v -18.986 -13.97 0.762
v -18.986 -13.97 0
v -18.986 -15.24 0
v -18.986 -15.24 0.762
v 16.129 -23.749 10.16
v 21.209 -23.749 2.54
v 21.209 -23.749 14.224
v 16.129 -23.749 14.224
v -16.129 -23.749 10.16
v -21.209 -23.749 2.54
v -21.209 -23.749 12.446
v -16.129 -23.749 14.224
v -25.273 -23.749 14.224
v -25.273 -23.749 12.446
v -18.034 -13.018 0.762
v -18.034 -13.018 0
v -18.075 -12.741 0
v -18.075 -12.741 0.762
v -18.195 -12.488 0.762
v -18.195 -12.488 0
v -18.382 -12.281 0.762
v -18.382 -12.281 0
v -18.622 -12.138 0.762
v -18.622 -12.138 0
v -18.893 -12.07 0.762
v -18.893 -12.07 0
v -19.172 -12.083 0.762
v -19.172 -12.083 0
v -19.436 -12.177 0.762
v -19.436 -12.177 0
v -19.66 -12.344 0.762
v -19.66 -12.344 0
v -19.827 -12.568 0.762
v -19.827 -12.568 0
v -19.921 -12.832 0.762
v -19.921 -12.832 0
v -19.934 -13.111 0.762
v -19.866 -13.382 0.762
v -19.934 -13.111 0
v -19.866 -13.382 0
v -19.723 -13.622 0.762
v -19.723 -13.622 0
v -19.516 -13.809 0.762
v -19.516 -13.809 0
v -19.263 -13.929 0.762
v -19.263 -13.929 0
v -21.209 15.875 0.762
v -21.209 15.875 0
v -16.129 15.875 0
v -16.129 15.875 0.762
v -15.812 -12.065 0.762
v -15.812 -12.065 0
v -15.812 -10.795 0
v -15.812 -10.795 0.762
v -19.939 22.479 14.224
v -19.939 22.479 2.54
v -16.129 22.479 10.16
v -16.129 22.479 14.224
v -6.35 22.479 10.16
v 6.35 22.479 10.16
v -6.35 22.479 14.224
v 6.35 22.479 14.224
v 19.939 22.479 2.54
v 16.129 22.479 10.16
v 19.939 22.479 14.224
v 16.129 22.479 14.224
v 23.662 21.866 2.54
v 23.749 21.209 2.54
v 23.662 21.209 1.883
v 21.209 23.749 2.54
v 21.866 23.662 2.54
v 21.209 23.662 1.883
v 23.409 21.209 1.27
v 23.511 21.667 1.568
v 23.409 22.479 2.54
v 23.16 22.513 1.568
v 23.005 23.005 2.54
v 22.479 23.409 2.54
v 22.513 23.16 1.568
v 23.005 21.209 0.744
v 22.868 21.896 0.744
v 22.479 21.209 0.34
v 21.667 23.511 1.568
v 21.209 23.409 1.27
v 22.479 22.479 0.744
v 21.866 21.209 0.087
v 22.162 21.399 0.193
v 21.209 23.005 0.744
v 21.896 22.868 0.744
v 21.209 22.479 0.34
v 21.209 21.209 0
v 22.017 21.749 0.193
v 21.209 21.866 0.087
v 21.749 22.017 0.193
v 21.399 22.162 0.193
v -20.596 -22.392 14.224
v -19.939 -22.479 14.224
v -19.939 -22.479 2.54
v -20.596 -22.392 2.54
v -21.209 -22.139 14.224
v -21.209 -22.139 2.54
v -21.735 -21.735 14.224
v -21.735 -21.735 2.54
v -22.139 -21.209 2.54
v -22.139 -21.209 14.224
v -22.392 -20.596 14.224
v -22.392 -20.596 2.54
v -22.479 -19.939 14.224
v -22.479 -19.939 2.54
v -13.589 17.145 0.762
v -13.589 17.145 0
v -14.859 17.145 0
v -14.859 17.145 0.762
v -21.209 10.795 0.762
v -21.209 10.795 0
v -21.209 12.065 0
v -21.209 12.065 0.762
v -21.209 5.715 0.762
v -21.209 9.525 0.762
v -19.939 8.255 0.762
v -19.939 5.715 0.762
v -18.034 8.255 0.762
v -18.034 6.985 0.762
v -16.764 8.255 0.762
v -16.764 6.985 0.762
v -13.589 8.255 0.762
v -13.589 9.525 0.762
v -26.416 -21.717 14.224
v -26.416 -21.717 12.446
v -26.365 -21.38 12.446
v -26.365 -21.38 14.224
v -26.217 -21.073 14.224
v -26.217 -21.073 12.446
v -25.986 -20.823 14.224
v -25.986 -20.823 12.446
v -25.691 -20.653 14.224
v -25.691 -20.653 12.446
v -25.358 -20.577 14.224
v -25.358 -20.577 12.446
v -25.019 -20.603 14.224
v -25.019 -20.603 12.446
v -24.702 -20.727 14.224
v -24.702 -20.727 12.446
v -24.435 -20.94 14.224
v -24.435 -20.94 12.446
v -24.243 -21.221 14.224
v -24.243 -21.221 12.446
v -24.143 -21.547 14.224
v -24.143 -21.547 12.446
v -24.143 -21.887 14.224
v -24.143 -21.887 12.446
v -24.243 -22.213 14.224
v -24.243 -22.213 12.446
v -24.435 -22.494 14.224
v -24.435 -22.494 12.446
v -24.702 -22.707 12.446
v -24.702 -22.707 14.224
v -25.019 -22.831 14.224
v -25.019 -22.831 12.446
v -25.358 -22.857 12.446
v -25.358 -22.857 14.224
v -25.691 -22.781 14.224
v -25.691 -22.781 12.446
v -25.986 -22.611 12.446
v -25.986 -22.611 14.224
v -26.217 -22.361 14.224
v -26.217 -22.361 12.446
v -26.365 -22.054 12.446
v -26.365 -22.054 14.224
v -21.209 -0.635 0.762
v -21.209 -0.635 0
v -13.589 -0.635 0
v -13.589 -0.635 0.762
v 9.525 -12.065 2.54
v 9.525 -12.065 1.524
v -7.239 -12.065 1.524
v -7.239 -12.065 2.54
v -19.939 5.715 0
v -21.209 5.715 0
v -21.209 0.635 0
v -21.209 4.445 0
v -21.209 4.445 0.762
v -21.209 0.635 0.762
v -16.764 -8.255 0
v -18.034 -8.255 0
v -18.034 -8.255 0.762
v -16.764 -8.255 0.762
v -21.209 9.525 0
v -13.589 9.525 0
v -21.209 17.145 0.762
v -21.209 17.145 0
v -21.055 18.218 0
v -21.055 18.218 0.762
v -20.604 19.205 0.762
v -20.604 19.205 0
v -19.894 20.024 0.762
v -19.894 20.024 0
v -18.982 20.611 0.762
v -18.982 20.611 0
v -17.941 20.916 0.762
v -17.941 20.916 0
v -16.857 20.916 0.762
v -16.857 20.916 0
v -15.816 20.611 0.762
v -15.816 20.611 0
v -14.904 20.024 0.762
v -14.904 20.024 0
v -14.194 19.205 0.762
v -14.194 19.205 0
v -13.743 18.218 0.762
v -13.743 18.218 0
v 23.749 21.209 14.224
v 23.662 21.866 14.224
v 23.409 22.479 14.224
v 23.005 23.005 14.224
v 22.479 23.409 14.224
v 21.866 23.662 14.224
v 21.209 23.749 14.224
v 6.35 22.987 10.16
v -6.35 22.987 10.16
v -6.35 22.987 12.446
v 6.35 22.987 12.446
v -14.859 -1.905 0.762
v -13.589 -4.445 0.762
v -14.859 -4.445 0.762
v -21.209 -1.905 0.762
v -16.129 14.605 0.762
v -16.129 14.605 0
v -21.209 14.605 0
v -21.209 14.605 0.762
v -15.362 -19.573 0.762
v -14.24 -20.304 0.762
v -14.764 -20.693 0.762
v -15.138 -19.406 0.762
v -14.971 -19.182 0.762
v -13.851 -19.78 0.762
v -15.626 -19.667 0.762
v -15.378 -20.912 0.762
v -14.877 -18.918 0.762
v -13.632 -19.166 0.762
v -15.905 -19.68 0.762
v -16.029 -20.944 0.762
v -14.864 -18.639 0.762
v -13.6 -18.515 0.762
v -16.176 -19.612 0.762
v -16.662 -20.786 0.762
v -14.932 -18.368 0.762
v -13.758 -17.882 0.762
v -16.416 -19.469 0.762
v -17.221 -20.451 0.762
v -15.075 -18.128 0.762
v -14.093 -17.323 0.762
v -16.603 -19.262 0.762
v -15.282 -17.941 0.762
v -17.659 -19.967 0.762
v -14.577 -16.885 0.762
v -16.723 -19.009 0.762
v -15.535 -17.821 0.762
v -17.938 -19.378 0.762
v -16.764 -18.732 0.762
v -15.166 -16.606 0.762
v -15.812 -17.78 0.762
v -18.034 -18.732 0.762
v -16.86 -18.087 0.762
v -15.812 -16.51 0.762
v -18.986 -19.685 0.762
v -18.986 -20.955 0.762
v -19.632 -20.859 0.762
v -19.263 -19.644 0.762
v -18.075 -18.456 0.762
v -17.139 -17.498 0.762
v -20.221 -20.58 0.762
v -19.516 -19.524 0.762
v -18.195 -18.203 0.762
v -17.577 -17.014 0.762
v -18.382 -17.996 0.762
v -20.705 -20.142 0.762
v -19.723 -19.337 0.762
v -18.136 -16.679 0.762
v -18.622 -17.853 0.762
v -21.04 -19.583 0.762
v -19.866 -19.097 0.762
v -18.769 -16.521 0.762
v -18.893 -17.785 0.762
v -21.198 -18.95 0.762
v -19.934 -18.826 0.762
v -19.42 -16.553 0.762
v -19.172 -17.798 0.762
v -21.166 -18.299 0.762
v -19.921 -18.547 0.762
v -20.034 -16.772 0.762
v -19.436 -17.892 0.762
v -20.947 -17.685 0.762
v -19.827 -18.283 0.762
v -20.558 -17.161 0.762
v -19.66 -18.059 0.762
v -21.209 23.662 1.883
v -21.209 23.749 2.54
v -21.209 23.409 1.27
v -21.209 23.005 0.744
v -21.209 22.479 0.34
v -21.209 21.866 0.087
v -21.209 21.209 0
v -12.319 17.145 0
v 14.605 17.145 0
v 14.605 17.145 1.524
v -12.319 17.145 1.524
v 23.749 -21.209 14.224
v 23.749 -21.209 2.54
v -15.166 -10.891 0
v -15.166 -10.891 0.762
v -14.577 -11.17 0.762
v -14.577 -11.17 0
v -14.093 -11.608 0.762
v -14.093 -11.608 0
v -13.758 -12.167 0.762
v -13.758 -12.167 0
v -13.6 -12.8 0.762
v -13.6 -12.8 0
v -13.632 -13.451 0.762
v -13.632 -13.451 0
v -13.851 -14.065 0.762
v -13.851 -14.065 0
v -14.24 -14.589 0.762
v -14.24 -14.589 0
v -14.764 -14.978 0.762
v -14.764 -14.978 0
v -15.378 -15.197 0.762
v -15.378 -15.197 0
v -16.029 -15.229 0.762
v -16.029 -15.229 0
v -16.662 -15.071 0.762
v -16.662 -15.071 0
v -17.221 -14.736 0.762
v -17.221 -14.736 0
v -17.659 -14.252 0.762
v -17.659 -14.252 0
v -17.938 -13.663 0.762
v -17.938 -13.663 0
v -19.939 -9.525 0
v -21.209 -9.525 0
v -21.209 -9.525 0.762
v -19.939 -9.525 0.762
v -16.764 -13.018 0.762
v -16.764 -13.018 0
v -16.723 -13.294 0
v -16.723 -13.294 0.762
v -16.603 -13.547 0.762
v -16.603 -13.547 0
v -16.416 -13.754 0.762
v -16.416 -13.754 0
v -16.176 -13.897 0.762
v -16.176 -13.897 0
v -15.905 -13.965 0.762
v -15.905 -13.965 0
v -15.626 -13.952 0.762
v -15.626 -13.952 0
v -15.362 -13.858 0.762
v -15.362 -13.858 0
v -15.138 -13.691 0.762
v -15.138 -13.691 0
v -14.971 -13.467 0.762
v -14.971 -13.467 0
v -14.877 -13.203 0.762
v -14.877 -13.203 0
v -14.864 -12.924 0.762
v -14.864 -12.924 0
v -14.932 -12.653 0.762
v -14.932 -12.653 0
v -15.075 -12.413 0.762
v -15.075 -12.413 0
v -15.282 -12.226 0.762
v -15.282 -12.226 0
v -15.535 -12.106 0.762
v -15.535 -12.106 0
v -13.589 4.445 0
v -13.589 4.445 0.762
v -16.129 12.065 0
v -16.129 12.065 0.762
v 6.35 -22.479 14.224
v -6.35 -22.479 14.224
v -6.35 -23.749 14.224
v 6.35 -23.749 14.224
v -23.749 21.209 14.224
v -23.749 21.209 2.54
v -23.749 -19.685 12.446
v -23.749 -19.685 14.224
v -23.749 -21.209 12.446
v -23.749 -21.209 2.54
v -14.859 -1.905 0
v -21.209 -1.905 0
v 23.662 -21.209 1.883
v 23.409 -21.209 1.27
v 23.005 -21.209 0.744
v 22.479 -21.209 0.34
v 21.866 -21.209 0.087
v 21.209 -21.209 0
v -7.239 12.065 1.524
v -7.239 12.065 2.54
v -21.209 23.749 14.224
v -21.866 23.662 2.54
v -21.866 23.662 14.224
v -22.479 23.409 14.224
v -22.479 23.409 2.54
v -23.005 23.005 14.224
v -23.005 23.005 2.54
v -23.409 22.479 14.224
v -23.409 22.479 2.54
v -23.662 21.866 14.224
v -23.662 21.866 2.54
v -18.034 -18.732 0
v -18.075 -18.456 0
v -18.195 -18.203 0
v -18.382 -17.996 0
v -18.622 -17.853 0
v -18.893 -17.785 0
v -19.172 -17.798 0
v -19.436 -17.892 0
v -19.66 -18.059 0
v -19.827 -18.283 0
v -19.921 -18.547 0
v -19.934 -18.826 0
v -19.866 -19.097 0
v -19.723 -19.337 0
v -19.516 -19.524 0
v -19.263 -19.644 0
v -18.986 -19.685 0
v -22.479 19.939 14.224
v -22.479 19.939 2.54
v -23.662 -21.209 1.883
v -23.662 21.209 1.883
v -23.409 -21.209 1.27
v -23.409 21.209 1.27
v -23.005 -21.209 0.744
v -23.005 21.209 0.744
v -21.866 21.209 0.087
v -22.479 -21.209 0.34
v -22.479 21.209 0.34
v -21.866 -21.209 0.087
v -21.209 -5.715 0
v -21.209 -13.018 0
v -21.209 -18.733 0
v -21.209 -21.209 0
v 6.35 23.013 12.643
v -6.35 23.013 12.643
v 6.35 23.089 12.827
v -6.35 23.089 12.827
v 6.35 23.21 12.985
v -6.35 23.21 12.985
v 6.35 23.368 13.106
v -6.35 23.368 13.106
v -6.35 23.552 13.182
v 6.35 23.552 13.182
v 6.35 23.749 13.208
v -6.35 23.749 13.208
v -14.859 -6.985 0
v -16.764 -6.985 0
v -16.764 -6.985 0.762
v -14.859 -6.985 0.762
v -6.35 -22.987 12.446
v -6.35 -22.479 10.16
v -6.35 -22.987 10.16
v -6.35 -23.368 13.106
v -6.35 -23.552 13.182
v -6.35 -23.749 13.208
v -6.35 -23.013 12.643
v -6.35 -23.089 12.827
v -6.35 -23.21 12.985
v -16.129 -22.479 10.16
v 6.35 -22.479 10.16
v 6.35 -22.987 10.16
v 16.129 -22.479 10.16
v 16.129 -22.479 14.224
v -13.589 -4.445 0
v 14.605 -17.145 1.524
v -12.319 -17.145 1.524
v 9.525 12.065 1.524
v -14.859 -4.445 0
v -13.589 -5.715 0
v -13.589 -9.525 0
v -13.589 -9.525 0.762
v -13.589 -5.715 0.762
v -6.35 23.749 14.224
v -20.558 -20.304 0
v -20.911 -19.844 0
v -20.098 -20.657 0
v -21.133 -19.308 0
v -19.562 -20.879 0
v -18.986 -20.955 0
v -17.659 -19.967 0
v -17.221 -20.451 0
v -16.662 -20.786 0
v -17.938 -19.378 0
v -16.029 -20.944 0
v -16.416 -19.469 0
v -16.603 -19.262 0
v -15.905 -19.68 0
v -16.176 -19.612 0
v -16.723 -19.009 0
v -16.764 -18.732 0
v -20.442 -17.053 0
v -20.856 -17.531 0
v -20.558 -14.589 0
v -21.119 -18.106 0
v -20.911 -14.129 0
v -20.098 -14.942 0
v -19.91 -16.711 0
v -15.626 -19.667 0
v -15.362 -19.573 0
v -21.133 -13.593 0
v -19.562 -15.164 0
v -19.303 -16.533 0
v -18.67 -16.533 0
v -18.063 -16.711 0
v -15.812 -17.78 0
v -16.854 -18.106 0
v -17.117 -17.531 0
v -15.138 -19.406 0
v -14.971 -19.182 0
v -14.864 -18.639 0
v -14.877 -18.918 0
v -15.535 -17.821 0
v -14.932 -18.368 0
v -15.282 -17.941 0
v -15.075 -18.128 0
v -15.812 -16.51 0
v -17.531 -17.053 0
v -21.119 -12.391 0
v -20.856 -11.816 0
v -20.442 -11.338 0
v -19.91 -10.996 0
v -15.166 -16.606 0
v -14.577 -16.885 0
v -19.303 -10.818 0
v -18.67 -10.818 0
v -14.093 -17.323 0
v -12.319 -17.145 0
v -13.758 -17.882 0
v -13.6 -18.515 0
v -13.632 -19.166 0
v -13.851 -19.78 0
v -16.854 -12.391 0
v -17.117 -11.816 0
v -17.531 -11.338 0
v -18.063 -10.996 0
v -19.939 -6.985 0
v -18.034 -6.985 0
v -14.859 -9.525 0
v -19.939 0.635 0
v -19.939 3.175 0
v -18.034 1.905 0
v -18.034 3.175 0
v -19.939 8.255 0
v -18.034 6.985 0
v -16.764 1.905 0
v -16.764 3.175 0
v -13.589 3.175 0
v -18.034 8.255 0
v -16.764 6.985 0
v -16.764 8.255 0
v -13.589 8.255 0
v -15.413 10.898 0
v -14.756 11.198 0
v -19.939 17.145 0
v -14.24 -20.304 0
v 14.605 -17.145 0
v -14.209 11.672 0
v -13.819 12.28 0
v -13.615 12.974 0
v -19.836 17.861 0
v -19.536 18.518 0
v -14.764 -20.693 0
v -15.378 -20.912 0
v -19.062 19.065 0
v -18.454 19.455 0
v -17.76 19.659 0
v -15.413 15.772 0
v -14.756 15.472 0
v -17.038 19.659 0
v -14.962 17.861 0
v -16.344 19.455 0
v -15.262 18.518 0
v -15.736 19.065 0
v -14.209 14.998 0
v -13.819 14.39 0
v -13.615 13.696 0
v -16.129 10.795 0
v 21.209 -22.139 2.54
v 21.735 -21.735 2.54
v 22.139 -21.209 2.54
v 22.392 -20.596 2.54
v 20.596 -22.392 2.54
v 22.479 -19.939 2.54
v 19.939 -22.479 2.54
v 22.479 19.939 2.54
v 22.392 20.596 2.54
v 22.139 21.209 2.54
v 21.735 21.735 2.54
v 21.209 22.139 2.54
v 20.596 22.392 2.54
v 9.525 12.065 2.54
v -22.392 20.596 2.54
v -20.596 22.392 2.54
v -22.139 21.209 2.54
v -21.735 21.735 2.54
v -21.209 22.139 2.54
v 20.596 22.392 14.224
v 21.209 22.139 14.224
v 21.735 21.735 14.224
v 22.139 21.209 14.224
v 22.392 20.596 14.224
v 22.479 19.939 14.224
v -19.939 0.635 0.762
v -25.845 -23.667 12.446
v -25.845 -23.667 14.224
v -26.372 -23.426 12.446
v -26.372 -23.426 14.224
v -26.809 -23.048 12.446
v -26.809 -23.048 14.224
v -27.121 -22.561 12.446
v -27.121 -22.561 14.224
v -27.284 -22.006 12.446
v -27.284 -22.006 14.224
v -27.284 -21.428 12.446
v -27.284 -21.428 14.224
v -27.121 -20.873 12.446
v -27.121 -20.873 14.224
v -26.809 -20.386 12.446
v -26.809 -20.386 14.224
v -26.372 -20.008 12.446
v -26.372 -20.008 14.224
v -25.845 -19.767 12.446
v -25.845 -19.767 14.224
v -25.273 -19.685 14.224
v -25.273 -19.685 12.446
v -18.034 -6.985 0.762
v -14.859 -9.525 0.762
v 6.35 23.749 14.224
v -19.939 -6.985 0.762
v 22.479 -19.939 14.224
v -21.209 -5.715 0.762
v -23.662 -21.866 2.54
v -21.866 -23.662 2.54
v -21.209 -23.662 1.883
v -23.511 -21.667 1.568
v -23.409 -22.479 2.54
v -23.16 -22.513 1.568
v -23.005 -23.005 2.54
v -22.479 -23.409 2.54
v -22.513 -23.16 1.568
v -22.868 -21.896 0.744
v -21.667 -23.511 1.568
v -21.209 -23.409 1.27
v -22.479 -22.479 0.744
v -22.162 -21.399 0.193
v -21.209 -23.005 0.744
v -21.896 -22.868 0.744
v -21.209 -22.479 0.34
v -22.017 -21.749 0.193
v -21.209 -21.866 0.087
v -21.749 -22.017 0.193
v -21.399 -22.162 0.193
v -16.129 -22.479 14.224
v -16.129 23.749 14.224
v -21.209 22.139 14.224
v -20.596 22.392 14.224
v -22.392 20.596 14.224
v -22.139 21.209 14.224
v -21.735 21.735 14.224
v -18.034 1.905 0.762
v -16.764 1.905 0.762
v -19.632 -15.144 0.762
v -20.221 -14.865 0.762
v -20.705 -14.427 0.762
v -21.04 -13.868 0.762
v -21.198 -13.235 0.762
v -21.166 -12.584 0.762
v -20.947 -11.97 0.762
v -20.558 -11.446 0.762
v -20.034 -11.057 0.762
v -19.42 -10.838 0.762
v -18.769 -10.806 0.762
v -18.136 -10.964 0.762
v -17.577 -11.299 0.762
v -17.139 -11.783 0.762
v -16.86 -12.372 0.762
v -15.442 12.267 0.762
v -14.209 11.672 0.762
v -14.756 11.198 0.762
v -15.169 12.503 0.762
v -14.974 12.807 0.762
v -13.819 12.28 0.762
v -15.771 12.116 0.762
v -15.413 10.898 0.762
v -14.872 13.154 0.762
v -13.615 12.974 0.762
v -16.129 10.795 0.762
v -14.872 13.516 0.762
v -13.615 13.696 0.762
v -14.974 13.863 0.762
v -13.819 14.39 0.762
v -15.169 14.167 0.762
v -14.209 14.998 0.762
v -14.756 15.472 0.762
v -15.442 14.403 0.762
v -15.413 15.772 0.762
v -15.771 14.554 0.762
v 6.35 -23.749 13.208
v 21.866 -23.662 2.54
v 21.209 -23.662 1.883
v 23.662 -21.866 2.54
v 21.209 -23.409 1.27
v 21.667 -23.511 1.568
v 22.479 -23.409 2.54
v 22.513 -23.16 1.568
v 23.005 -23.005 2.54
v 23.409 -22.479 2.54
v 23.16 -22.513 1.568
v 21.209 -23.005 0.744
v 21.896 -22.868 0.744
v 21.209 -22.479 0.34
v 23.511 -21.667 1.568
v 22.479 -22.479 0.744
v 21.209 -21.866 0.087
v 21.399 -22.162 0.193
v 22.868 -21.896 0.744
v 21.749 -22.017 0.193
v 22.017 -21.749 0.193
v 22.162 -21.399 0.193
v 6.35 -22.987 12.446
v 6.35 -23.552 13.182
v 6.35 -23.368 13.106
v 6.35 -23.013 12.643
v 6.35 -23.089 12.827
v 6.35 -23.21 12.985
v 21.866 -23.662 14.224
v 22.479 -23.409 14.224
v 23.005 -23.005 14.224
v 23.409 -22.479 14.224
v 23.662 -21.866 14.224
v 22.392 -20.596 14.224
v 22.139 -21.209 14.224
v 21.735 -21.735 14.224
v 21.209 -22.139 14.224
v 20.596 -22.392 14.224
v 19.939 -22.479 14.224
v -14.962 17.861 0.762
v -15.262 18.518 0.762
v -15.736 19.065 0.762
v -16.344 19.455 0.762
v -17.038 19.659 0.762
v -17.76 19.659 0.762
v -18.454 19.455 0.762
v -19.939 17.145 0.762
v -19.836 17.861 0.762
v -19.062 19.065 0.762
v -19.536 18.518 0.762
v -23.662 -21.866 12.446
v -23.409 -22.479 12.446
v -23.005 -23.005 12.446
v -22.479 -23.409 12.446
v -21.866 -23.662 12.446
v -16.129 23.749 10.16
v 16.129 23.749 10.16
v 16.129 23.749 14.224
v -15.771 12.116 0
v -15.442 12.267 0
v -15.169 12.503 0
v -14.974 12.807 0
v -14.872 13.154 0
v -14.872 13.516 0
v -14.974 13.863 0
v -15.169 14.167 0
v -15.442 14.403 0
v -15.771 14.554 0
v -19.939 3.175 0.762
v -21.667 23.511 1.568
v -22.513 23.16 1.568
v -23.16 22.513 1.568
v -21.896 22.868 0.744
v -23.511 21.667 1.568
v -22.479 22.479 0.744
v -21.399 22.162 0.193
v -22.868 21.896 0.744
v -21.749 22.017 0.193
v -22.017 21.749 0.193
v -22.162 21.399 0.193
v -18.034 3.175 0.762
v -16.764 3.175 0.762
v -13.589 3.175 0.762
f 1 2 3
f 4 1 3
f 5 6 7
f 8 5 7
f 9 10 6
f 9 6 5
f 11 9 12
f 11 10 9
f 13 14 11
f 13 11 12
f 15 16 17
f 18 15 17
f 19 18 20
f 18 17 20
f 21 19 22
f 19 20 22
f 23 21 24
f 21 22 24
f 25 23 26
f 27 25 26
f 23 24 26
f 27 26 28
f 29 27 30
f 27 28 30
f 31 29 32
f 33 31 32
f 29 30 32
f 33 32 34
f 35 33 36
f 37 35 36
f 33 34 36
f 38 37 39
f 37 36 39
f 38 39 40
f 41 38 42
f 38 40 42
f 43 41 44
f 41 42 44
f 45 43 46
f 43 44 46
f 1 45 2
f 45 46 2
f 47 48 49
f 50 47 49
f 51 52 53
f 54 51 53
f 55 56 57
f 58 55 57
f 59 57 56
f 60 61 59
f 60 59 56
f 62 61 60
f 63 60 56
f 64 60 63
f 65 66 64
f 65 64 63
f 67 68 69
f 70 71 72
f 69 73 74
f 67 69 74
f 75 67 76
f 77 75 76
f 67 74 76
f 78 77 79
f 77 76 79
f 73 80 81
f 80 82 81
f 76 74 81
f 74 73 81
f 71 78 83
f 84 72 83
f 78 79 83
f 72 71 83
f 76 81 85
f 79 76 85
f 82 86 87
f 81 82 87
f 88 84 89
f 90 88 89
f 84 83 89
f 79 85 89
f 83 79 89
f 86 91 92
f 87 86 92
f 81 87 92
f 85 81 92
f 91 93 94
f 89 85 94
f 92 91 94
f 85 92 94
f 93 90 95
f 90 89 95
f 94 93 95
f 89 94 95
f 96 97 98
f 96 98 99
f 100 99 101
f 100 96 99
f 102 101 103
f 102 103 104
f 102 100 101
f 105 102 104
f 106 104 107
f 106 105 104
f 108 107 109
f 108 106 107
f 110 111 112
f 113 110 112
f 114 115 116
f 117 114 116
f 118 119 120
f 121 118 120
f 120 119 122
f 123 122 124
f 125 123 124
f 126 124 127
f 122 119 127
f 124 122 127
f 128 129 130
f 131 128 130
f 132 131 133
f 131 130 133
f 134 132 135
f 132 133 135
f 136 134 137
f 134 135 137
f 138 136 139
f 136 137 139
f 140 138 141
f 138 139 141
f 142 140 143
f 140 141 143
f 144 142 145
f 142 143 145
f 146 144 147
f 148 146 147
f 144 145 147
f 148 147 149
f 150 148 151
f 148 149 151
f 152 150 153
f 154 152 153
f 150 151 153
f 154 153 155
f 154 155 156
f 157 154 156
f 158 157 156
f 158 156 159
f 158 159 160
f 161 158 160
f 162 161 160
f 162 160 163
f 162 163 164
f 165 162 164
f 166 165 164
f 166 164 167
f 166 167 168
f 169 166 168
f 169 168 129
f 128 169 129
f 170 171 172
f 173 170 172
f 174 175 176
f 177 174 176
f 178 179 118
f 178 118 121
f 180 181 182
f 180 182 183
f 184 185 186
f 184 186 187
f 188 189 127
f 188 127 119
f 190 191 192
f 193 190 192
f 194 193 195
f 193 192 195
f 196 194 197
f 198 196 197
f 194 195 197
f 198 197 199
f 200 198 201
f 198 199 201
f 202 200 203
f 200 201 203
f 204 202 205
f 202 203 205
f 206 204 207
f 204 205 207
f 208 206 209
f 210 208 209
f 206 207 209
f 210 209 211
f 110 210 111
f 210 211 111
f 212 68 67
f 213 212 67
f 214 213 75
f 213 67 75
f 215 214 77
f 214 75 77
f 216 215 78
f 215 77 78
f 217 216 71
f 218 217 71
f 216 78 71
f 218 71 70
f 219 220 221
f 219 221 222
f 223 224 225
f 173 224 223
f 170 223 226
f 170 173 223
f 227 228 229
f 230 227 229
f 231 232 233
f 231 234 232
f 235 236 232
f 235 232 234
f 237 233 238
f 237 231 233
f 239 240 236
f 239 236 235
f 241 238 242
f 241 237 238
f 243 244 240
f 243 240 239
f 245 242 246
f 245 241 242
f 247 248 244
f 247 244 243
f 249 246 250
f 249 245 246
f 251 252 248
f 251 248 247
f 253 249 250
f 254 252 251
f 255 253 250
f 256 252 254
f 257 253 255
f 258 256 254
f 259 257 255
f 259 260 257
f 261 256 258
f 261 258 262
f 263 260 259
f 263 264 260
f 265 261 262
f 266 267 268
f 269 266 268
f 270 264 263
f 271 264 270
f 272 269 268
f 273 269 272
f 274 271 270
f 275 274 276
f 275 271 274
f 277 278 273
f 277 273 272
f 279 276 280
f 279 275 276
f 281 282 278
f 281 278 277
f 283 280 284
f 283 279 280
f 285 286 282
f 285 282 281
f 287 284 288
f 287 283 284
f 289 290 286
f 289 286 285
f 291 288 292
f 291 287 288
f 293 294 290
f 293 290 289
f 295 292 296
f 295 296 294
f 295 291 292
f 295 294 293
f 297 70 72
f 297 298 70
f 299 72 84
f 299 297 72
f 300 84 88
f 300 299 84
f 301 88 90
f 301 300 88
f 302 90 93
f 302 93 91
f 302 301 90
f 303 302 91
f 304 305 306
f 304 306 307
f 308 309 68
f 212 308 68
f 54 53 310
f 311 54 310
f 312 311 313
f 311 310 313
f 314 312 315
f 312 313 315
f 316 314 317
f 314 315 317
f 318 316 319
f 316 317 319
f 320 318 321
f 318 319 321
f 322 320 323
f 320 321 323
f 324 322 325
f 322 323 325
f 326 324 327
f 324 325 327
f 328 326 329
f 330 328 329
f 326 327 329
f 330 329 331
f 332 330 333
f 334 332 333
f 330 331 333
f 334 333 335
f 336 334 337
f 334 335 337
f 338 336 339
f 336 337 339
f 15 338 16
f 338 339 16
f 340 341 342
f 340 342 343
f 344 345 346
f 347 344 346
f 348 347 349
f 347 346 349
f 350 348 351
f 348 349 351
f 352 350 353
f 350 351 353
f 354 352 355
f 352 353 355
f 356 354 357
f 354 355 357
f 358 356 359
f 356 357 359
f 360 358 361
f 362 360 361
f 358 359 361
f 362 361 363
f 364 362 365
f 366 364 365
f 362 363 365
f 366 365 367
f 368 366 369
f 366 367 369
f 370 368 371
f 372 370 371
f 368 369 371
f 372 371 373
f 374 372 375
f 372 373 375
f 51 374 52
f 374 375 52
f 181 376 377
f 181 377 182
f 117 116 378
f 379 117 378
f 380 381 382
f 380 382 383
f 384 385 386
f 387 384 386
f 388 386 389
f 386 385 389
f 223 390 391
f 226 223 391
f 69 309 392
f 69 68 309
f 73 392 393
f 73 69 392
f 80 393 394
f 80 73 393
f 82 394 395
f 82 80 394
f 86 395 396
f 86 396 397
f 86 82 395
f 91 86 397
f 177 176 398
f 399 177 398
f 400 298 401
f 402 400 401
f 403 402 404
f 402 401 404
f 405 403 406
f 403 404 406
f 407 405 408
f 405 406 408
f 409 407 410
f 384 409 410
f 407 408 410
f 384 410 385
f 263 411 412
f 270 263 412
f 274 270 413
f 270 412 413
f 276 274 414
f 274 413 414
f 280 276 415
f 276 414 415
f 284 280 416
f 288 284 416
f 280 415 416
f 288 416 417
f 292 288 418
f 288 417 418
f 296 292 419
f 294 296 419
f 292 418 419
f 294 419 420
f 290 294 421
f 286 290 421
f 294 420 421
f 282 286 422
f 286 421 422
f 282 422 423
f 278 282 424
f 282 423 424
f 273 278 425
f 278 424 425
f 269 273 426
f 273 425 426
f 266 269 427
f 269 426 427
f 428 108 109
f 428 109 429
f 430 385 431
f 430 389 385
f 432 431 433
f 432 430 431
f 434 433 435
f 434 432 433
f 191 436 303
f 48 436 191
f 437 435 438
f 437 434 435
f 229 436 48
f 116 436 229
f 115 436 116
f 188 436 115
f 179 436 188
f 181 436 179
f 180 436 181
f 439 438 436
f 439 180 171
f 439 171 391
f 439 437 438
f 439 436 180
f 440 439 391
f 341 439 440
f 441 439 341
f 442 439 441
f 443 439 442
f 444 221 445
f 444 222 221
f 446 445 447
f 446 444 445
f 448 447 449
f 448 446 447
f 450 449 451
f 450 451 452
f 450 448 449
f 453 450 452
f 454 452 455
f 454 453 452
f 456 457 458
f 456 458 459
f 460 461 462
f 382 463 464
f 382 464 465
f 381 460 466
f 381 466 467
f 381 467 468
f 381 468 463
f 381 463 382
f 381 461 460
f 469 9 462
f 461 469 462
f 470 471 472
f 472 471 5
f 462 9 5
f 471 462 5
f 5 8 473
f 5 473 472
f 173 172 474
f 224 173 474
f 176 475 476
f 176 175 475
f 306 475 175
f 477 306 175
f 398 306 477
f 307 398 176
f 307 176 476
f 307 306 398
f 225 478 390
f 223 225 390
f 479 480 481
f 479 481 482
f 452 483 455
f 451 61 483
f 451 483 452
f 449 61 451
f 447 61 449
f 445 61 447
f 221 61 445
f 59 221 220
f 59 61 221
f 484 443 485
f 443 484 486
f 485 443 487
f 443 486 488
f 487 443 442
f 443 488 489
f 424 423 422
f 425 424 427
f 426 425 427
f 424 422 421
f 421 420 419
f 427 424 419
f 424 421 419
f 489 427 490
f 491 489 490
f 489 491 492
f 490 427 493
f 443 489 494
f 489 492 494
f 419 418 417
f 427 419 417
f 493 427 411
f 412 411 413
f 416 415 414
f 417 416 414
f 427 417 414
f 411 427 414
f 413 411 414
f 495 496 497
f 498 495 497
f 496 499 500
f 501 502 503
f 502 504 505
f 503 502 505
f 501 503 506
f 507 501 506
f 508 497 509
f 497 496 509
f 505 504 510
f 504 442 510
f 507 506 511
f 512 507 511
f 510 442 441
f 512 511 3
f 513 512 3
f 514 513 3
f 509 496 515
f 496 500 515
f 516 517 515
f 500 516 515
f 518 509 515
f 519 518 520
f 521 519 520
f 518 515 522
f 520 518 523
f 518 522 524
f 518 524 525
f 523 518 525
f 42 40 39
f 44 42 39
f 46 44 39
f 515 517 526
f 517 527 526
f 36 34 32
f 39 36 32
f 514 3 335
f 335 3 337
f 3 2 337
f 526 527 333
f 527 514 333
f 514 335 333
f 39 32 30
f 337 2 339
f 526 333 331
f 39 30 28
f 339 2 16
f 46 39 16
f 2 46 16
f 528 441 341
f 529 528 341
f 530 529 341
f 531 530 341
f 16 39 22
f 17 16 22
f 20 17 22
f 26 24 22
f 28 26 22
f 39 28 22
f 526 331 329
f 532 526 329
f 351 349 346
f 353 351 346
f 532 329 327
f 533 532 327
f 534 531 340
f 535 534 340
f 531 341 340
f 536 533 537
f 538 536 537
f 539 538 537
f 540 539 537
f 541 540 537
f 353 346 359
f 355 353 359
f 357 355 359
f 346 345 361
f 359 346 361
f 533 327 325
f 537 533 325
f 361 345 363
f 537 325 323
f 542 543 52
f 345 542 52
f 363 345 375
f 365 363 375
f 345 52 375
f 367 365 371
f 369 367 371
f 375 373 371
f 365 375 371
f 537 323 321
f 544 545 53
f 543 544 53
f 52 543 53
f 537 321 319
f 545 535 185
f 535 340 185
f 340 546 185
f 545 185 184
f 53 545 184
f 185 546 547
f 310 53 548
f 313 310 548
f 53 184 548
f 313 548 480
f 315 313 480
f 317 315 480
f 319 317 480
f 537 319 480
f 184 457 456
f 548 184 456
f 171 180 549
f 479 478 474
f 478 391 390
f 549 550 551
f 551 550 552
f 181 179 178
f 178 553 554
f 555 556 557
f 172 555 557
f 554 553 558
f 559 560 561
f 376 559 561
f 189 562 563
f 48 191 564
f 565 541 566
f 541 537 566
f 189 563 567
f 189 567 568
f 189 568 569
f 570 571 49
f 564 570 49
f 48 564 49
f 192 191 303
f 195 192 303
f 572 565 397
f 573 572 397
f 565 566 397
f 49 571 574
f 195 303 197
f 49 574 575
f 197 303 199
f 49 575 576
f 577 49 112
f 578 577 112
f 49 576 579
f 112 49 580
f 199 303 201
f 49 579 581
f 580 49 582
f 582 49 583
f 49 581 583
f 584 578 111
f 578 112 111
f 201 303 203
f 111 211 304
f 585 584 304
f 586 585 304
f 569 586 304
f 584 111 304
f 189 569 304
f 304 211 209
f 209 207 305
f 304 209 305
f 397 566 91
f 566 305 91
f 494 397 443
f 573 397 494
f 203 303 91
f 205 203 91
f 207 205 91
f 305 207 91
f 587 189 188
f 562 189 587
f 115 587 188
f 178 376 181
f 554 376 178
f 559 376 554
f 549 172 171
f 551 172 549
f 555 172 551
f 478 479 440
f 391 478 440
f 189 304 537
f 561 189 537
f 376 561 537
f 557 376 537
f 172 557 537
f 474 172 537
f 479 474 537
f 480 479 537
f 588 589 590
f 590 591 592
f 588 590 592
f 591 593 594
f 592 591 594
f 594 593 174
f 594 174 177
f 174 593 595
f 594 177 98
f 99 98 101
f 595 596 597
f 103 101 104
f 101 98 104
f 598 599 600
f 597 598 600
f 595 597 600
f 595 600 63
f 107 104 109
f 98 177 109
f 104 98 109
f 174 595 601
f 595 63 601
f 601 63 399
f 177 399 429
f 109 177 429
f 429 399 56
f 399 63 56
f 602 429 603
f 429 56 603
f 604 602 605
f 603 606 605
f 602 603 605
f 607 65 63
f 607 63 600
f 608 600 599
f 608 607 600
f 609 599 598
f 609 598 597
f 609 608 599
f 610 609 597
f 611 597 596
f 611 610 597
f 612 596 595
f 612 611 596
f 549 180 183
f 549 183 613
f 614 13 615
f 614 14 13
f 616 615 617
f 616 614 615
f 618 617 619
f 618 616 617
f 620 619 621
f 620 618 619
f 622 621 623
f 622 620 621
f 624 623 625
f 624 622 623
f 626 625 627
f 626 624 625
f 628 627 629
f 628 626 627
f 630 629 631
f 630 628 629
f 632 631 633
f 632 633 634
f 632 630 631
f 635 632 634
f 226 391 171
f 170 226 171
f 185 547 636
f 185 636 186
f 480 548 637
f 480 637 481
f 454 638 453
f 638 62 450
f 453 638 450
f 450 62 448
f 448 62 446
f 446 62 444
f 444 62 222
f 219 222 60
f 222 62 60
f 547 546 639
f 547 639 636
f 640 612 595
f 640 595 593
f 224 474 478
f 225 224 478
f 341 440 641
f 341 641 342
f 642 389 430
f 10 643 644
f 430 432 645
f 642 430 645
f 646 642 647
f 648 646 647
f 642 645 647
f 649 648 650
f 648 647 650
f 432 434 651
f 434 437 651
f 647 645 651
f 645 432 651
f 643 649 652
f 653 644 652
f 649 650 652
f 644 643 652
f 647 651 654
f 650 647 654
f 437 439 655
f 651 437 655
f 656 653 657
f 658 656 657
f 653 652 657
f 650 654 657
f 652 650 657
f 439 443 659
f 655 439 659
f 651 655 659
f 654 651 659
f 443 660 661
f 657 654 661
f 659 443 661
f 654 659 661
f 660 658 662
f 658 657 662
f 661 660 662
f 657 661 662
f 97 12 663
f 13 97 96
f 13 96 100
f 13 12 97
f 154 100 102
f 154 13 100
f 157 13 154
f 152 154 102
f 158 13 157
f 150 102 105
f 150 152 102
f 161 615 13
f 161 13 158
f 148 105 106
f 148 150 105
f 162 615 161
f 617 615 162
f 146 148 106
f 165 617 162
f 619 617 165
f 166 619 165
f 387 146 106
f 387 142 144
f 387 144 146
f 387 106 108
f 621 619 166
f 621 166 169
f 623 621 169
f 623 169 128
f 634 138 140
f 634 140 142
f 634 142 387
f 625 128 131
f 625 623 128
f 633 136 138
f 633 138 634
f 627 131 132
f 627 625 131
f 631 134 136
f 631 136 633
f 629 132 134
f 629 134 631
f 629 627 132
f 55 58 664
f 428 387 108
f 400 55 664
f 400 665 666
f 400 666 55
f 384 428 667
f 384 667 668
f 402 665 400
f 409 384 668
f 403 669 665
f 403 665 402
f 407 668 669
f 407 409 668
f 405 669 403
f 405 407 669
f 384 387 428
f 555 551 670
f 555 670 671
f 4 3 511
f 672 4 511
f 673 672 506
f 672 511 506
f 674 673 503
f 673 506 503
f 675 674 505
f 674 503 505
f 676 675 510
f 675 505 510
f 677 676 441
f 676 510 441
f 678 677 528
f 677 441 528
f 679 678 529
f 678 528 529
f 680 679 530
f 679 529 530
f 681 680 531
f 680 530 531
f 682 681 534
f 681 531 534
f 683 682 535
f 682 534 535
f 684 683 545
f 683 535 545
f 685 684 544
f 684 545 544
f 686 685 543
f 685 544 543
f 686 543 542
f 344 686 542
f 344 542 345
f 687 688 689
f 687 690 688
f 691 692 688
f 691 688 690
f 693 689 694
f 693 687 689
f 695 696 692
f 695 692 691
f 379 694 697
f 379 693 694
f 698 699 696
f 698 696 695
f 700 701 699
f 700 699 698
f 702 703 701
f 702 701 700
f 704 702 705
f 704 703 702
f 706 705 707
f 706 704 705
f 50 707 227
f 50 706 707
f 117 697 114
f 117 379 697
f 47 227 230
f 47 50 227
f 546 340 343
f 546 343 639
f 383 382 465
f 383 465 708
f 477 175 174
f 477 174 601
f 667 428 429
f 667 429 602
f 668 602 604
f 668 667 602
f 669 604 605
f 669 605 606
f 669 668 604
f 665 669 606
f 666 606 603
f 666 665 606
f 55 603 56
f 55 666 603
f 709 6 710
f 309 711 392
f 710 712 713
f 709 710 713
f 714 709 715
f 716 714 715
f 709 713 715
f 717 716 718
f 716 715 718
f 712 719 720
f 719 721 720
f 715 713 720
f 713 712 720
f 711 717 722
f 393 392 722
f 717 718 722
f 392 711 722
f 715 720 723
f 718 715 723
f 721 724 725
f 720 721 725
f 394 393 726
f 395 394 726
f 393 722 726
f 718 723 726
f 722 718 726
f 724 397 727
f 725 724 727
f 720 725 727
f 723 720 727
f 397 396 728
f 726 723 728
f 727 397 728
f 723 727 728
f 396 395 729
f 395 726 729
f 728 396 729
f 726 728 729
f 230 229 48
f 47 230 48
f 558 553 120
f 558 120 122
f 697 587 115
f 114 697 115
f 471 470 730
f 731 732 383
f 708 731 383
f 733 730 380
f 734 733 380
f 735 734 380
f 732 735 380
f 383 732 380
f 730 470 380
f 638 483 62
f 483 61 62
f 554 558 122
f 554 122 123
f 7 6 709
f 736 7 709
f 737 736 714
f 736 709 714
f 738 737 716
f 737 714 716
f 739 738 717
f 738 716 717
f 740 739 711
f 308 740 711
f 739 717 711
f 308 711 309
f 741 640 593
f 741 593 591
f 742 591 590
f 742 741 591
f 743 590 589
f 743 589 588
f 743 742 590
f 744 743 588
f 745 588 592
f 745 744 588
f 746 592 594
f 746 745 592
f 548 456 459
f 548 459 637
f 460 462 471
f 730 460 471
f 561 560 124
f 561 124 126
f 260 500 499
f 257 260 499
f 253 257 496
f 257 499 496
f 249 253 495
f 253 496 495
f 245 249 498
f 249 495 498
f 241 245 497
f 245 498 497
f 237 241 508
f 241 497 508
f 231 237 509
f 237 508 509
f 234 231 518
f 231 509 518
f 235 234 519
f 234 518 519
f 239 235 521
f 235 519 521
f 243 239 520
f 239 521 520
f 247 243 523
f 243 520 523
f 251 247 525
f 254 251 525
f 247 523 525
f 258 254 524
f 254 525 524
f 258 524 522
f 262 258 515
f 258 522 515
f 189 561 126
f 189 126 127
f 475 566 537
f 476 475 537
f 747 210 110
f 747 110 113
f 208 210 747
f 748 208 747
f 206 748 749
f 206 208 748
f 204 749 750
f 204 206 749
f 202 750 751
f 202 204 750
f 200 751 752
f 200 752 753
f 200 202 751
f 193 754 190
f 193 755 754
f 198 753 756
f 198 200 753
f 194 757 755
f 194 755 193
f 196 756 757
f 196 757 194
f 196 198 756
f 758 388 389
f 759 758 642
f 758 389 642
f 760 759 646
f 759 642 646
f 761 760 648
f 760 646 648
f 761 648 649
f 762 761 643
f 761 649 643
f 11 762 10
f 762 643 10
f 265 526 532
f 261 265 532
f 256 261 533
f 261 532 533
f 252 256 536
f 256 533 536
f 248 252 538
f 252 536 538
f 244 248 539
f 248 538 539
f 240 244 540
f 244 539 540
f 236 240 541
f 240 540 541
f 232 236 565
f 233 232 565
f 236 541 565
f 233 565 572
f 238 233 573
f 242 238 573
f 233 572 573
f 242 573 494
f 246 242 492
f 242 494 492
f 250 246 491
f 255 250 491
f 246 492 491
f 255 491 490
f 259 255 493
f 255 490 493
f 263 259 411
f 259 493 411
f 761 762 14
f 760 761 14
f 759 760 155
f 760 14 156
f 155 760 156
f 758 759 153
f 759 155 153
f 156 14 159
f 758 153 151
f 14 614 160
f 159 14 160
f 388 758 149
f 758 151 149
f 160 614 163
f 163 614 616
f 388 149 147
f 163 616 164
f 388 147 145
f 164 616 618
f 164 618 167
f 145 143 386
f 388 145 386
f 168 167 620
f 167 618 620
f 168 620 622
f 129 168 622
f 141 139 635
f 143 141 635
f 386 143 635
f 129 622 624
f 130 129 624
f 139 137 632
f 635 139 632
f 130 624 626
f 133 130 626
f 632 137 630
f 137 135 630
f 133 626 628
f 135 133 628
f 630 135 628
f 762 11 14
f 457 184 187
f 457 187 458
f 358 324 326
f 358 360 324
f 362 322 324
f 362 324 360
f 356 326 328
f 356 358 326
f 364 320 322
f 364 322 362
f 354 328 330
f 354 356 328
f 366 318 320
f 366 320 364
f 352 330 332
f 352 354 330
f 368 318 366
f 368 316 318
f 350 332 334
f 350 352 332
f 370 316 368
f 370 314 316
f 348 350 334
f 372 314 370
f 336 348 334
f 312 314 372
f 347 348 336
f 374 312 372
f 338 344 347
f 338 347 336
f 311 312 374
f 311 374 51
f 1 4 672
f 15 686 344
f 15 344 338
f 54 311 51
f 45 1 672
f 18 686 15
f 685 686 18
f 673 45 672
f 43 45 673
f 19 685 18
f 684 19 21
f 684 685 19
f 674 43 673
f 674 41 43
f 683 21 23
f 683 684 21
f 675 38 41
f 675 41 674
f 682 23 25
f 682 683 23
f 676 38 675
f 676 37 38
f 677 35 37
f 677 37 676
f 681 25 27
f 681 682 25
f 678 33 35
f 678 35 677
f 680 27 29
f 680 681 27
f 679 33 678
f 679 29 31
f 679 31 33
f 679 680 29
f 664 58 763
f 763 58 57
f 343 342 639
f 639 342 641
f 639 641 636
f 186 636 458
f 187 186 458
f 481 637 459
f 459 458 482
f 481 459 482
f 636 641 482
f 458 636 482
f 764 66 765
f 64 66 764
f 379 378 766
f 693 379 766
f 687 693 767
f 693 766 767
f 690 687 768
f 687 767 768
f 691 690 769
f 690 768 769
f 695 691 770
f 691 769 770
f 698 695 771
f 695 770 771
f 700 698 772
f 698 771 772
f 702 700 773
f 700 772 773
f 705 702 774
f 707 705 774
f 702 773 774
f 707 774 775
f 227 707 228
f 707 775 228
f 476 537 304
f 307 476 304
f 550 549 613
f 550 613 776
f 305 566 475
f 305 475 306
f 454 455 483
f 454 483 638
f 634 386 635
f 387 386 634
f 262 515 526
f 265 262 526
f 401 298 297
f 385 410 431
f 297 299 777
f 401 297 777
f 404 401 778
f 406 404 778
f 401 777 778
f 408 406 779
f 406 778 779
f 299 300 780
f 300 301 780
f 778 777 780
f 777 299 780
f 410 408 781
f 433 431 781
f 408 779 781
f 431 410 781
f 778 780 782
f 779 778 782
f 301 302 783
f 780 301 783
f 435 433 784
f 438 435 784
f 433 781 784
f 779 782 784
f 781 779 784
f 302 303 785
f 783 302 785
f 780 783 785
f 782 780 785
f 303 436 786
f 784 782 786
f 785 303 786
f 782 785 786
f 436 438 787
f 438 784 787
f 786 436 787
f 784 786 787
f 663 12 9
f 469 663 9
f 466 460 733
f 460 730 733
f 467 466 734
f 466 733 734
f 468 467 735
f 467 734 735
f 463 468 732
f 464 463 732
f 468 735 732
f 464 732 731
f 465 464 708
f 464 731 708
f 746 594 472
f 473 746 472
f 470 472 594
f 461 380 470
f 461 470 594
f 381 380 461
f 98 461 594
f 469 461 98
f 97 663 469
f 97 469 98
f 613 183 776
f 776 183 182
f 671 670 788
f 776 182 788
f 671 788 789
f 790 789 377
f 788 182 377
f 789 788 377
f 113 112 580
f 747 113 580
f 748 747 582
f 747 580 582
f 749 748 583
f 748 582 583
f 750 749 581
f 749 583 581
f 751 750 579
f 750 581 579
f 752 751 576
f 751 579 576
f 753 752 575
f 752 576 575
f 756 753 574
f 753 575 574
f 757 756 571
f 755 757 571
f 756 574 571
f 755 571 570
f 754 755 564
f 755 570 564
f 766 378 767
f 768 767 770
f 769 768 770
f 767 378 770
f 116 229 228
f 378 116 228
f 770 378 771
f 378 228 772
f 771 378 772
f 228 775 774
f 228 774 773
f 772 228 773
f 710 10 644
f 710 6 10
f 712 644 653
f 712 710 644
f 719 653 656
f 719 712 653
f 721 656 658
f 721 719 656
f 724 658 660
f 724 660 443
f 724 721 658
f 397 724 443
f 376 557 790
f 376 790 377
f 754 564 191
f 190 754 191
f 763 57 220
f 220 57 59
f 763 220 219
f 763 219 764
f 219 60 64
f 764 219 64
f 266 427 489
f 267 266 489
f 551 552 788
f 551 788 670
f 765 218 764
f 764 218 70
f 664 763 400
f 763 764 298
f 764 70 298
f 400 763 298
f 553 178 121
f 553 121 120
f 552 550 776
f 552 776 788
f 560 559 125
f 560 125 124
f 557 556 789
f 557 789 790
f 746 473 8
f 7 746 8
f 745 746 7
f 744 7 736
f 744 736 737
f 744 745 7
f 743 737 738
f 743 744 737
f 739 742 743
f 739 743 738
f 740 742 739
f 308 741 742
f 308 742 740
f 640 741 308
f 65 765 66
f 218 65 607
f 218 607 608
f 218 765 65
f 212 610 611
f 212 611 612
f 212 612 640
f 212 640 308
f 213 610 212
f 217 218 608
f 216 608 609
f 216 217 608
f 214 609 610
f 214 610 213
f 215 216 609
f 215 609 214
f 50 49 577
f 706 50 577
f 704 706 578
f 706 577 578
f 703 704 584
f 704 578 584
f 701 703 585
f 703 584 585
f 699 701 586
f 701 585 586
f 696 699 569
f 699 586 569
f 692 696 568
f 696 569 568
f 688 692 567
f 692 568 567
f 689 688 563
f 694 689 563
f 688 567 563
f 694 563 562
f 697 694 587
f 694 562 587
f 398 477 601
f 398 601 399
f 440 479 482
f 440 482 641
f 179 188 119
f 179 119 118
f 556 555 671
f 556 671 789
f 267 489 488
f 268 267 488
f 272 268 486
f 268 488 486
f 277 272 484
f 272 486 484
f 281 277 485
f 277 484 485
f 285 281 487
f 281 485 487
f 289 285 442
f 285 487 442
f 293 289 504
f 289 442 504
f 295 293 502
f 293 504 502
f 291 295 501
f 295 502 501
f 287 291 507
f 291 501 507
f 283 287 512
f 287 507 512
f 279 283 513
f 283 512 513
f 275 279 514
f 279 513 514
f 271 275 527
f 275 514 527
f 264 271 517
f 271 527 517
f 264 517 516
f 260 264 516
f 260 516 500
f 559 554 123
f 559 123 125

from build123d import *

# Parameters (mm, degrees)
BOSS_EXTRUDE1_DEPTH             = 14.224
CUT_EXTRUDE1_DEPTH              = 11.684
FILLET1_R                       = 2.54
CUT_EXTRUDE2_DEPTH              = 55.976332917
CUT_EXTRUDE2_DEPTH_BACK         = 55.976332917
SKETCH3_W                       = 32.258
SKETCH3_H                       = 8.128
SKETCH5_W                       = 26.924
SKETCH5_H                       = 34.29
CUT_EXTRUDE4_DEPTH              = 1.524
SKETCH6_W                       = 16.764
SKETCH6_H                       = 24.13
CUT_EXTRUDE5_DEPTH              = 1.524
SKETCH8_W                       = 12.7
SKETCH8_H                       = 0.508
BOSS_EXTRUDE3_DEPTH             = 4.064
SKETCH9_W                       = 12.7
SKETCH9_H                       = 1.016
BOSS_EXTRUDE4_DEPTH             = 0.762
FILLET2_R                       = 0.762
SKETCH10_W                      = 12.7
SKETCH10_H                      = 1.016
BOSS_EXTRUDE5_DEPTH             = 0.762
FILLET3_R                       = 0.762
SKETCH11_W                      = 1.778
SKETCH11_H                      = 4.064
BOSS_EXTRUDE6_DEPTH             = 3.556
BOSS_EXTRUDE6_DIRECTION_2_REACH = 56.976
FILLET4_RADIUS                  = 2.032
FILLET4_LENGTH                  = 1.778
SKETCH12_R                      = 1.143
CUT_EXTRUDE7_DEPTH              = 4.064
CUT_EXTRUDE8_DEPTH              = 0.762


with BuildPart() as part:
    # Sketch1 → Boss-Extrude1 (new body)
    with BuildSketch(Plane.XY):
        with BuildLine():
            Line((-21.209, -23.749), (21.209, -23.749))
            ThreePointArc((21.209, -23.749), (23.005051224, -23.005051224), (23.749, -21.209))
            Line((23.749, -21.209), (23.749, 21.209))
            ThreePointArc((23.749, 21.209), (23.005051224, 23.005051224), (21.209, 23.749))
            Line((21.209, 23.749), (-21.209, 23.749))
            ThreePointArc((-21.209, 23.749), (-23.005051224, 23.005051224), (-23.749, 21.209))
            Line((-23.749, 21.209), (-23.749, -21.209))
            ThreePointArc((-23.749, -21.209), (-23.005051224, -23.005051224), (-21.209, -23.749))
        make_face()
    extrude(amount=BOSS_EXTRUDE1_DEPTH)

    # Sketch2 → Cut-Extrude1 (cut)
    with BuildSketch(Plane.XY.offset(14.224)):
        with BuildLine():
            Line((19.939, -22.479), (-19.939, -22.479))
            ThreePointArc((-19.939, -22.479), (-21.735051224, -21.735051224), (-22.479, -19.939))
            Line((-22.479, -19.939), (-22.479, 19.939))
            ThreePointArc((-22.479, 19.939), (-21.735051224, 21.735051224), (-19.939, 22.479))
            Line((-19.939, 22.479), (19.939, 22.479))
            ThreePointArc((19.939, 22.479), (21.735051224, 21.735051224), (22.479, 19.939))
            Line((22.479, 19.939), (22.479, -19.939))
            ThreePointArc((22.479, -19.939), (21.735051224, -21.735051224), (19.939, -22.479))
        make_face()
    extrude(amount=-CUT_EXTRUDE1_DEPTH, mode=Mode.SUBTRACT)

    # Fillet1
    fillet1_edges = [part.edges().sort_by_distance(p)[0] for p in [
        (0, -23.749, 0),
        (-23.005051224, -23.005051224, 0),
        (-23.749, 0, 0),
        (-23.005051224, 23.005051224, 0),
        (0, 23.749, 0),
        (23.005051224, 23.005051224, 0),
        (23.749, 0, 0),
        (23.005051224, -23.005051224, 0),
    ]]
    fillet(fillet1_edges, radius=FILLET1_R)

    # Sketch3 → Cut-Extrude2 (cut, two sides: drawn at the far end of the back side and taken through both)
    with BuildSketch(Plane(origin=(0, 23.749, 0), x_dir=(1, 0, 0), z_dir=(0, 1, 0)).offset(-CUT_EXTRUDE2_DEPTH_BACK)):
        with Locations((0, -14.224)):
            Rectangle(SKETCH3_W, SKETCH3_H)
    extrude(amount=CUT_EXTRUDE2_DEPTH + CUT_EXTRUDE2_DEPTH_BACK, mode=Mode.SUBTRACT)

    # Sketch5 → Cut-Extrude4 (cut)
    with BuildSketch(Plane(origin=(0, 0, 0), x_dir=(-1, 0, 0), z_dir=(0, 0, -1))):
        with Locations((-1.143, 0)):
            Rectangle(SKETCH5_W, SKETCH5_H)
    extrude(amount=-CUT_EXTRUDE4_DEPTH, mode=Mode.SUBTRACT)

    # Sketch6 → Cut-Extrude5 (cut)
    with BuildSketch(Plane(origin=(0, 0, 1.524), x_dir=(-1, 0, 0), z_dir=(0, 0, -1))):
        with Locations((-1.143, 0)):
            Rectangle(SKETCH6_W, SKETCH6_H)
    extrude(amount=-CUT_EXTRUDE5_DEPTH, mode=Mode.SUBTRACT)

    # Sketch8 → Boss-Extrude3 (add)
    with BuildSketch(Plane.XY.offset(10.16)):
        with Locations((0, 22.733)):
            Rectangle(SKETCH8_W, SKETCH8_H)
        with Locations((0, -22.733)):
            Rectangle(SKETCH8_W, SKETCH8_H)
    extrude(amount=BOSS_EXTRUDE3_DEPTH)

    # Sketch9 → Boss-Extrude4 (add)
    with BuildSketch(Plane(origin=(0, 22.987, 0), x_dir=(1, 0, 0), z_dir=(0, 1, 0))):
        with Locations((0, -13.716)):
            Rectangle(SKETCH9_W, SKETCH9_H)
    extrude(amount=BOSS_EXTRUDE4_DEPTH)

    # Fillet2
    fillet2_edges = [part.edges().sort_by_distance(p)[0] for p in [
        (0, 22.987, 13.208),
    ]]
    fillet(fillet2_edges, radius=FILLET2_R - 0.0001)  # a hair under: the kernel refuses the full size

    # Sketch10 → Boss-Extrude5 (add)
    with BuildSketch(Plane.XZ.offset(22.987)):
        with Locations((0, 13.716)):
            Rectangle(SKETCH10_W, SKETCH10_H)
    extrude(amount=BOSS_EXTRUDE5_DEPTH)

    # Fillet3
    fillet3_edges = [part.edges().sort_by_distance(p)[0] for p in [
        (0, -22.987, 13.208),
    ]]
    fillet(fillet3_edges, radius=FILLET3_R - 0.0001)  # a hair under: the kernel refuses the full size

    # Sketch11 → Boss-Extrude6 (add)
    with BuildSketch(Plane.ZY.offset(23.749)):
        with Locations((13.335, -21.717)):
            Rectangle(SKETCH11_W, SKETCH11_H)
    extrude(amount=BOSS_EXTRUDE6_DEPTH)

    # Sketch11 → Boss-Extrude6 direction 2 (add, up to next)
    with BuildSketch(Plane.ZY.offset(23.749), mode=Mode.PRIVATE) as boss_extrude6_direction_2_sk1:
        with Locations((13.335, -21.717)):
            Rectangle(SKETCH11_W, SKETCH11_H)
    boss_extrude6_direction_2_tool1 = extrude(boss_extrude6_direction_2_sk1.sketch, amount=-BOSS_EXTRUDE6_DIRECTION_2_REACH, mode=Mode.PRIVATE) - part.part
    add(boss_extrude6_direction_2_tool1.solids().sort_by_distance((-23.749, -21.717, 13.335))[0])

    # Fillet4: full round fillet: the end face becomes a half cylinder, R = half its width
    fillet4_face = Plane((-27.305, -21.717, 13.335), x_dir=(0, 0, -1), z_dir=(-1, 0, 0))  # on the end face: x along it, z out of the body
    fillet4_slab = fillet4_face.offset(-FILLET4_RADIUS / 2) * Box(FILLET4_LENGTH, 2 * FILLET4_RADIUS, FILLET4_RADIUS, mode=Mode.PRIVATE)  # the body's end, R deep
    fillet4_round = Plane((-25.273, -21.717, 13.335), x_dir=(-1, 0, 0), z_dir=(0, 0, -1)) * Cylinder(FILLET4_RADIUS, FILLET4_LENGTH, mode=Mode.PRIVATE)  # its axis R under the face
    add(fillet4_slab - fillet4_round, mode=Mode.SUBTRACT)

    # Sketch12 → Cut-Extrude7 (cut)
    with BuildSketch(Plane(origin=(0, 0, 12.446), x_dir=(-1, 0, 0), z_dir=(0, 0, -1))):
        with Locations((25.273, -21.717)):
            Circle(SKETCH12_R)
    extrude(amount=-CUT_EXTRUDE7_DEPTH, mode=Mode.SUBTRACT)

    # Sketch7 → Cut-Extrude8 (cut)
    with BuildSketch(Plane(origin=(0, 0, 0), x_dir=(-1, 0, 0), z_dir=(0, 0, -1))):
        with BuildLine():
            Line((19.939, 17.145), (21.209, 17.145))
            ThreePointArc((21.209, 17.145), (17.399, 20.955), (13.589, 17.145))
            Line((13.589, 17.145), (14.859, 17.145))
            ThreePointArc((14.859, 17.145), (17.399, 19.685), (19.939, 17.145))
        make_face()
        with BuildLine():
            Line((21.209, 15.875), (16.129, 15.875))
            ThreePointArc((16.129, 15.875), (13.589, 13.335), (16.129, 10.795))
            Line((16.129, 10.795), (21.209, 10.795))
            Line((21.209, 10.795), (21.209, 12.065))
            Line((21.209, 12.065), (16.129, 12.065))
            ThreePointArc((16.129, 12.065), (14.859, 13.335), (16.129, 14.605))
            Line((16.129, 14.605), (21.209, 14.605))
            Line((21.209, 14.605), (21.209, 15.875))
        make_face()
        Polygon((13.589, 9.525), (21.209, 9.525), (21.209, 5.715), (19.939, 5.715), (19.939, 8.255), (18.034, 8.255), (18.034, 6.985), (16.764, 6.985), (16.764, 8.255), (13.589, 8.255), align=None)
        Polygon((13.589, 4.445), (21.209, 4.445), (21.209, 0.635), (19.939, 0.635), (19.939, 3.175), (18.034, 3.175), (18.034, 1.905), (16.764, 1.905), (16.764, 3.175), (13.589, 3.175), align=None)
        Polygon((21.209, -0.635), (13.589, -0.635), (13.589, -4.445), (14.859, -4.445), (14.859, -1.905), (21.209, -1.905), align=None)
        Polygon((13.589, -5.715), (21.209, -5.715), (21.209, -9.525), (19.939, -9.525), (19.939, -6.985), (18.034, -6.985), (18.034, -8.255), (16.764, -8.255), (16.764, -6.985), (14.859, -6.985), (14.859, -9.525), (13.589, -9.525), align=None)
        with BuildLine():
            Line((18.9865, -13.97), (18.9865, -15.24))
            ThreePointArc((18.9865, -15.24), (20.558044821, -11.445955179), (16.764, -13.0175))
            ThreePointArc((16.764, -13.0175), (15.137980791, -13.691019209), (15.8115, -12.065))
            Line((15.8115, -12.065), (15.8115, -10.795))
            ThreePointArc((15.8115, -10.795), (14.239955179, -14.589044821), (18.034, -13.0175))
            ThreePointArc((18.034, -13.0175), (19.660019209, -12.343980791), (18.9865, -13.97))
        make_face()
        with BuildLine():
            Line((15.8115, -17.78), (15.8115, -16.51))
            ThreePointArc((15.8115, -16.51), (14.239955179, -20.304044821), (18.034, -18.7325))
            ThreePointArc((18.034, -18.7325), (19.660019209, -18.058980791), (18.9865, -19.685))
            Line((18.9865, -19.685), (18.9865, -20.955))
            ThreePointArc((18.9865, -20.955), (20.558044821, -17.160955179), (16.764, -18.7325))
            ThreePointArc((16.764, -18.7325), (15.137980791, -19.406019209), (15.8115, -17.78))
        make_face()
    extrude(amount=-CUT_EXTRUDE8_DEPTH, mode=Mode.SUBTRACT)


solid = part.part
